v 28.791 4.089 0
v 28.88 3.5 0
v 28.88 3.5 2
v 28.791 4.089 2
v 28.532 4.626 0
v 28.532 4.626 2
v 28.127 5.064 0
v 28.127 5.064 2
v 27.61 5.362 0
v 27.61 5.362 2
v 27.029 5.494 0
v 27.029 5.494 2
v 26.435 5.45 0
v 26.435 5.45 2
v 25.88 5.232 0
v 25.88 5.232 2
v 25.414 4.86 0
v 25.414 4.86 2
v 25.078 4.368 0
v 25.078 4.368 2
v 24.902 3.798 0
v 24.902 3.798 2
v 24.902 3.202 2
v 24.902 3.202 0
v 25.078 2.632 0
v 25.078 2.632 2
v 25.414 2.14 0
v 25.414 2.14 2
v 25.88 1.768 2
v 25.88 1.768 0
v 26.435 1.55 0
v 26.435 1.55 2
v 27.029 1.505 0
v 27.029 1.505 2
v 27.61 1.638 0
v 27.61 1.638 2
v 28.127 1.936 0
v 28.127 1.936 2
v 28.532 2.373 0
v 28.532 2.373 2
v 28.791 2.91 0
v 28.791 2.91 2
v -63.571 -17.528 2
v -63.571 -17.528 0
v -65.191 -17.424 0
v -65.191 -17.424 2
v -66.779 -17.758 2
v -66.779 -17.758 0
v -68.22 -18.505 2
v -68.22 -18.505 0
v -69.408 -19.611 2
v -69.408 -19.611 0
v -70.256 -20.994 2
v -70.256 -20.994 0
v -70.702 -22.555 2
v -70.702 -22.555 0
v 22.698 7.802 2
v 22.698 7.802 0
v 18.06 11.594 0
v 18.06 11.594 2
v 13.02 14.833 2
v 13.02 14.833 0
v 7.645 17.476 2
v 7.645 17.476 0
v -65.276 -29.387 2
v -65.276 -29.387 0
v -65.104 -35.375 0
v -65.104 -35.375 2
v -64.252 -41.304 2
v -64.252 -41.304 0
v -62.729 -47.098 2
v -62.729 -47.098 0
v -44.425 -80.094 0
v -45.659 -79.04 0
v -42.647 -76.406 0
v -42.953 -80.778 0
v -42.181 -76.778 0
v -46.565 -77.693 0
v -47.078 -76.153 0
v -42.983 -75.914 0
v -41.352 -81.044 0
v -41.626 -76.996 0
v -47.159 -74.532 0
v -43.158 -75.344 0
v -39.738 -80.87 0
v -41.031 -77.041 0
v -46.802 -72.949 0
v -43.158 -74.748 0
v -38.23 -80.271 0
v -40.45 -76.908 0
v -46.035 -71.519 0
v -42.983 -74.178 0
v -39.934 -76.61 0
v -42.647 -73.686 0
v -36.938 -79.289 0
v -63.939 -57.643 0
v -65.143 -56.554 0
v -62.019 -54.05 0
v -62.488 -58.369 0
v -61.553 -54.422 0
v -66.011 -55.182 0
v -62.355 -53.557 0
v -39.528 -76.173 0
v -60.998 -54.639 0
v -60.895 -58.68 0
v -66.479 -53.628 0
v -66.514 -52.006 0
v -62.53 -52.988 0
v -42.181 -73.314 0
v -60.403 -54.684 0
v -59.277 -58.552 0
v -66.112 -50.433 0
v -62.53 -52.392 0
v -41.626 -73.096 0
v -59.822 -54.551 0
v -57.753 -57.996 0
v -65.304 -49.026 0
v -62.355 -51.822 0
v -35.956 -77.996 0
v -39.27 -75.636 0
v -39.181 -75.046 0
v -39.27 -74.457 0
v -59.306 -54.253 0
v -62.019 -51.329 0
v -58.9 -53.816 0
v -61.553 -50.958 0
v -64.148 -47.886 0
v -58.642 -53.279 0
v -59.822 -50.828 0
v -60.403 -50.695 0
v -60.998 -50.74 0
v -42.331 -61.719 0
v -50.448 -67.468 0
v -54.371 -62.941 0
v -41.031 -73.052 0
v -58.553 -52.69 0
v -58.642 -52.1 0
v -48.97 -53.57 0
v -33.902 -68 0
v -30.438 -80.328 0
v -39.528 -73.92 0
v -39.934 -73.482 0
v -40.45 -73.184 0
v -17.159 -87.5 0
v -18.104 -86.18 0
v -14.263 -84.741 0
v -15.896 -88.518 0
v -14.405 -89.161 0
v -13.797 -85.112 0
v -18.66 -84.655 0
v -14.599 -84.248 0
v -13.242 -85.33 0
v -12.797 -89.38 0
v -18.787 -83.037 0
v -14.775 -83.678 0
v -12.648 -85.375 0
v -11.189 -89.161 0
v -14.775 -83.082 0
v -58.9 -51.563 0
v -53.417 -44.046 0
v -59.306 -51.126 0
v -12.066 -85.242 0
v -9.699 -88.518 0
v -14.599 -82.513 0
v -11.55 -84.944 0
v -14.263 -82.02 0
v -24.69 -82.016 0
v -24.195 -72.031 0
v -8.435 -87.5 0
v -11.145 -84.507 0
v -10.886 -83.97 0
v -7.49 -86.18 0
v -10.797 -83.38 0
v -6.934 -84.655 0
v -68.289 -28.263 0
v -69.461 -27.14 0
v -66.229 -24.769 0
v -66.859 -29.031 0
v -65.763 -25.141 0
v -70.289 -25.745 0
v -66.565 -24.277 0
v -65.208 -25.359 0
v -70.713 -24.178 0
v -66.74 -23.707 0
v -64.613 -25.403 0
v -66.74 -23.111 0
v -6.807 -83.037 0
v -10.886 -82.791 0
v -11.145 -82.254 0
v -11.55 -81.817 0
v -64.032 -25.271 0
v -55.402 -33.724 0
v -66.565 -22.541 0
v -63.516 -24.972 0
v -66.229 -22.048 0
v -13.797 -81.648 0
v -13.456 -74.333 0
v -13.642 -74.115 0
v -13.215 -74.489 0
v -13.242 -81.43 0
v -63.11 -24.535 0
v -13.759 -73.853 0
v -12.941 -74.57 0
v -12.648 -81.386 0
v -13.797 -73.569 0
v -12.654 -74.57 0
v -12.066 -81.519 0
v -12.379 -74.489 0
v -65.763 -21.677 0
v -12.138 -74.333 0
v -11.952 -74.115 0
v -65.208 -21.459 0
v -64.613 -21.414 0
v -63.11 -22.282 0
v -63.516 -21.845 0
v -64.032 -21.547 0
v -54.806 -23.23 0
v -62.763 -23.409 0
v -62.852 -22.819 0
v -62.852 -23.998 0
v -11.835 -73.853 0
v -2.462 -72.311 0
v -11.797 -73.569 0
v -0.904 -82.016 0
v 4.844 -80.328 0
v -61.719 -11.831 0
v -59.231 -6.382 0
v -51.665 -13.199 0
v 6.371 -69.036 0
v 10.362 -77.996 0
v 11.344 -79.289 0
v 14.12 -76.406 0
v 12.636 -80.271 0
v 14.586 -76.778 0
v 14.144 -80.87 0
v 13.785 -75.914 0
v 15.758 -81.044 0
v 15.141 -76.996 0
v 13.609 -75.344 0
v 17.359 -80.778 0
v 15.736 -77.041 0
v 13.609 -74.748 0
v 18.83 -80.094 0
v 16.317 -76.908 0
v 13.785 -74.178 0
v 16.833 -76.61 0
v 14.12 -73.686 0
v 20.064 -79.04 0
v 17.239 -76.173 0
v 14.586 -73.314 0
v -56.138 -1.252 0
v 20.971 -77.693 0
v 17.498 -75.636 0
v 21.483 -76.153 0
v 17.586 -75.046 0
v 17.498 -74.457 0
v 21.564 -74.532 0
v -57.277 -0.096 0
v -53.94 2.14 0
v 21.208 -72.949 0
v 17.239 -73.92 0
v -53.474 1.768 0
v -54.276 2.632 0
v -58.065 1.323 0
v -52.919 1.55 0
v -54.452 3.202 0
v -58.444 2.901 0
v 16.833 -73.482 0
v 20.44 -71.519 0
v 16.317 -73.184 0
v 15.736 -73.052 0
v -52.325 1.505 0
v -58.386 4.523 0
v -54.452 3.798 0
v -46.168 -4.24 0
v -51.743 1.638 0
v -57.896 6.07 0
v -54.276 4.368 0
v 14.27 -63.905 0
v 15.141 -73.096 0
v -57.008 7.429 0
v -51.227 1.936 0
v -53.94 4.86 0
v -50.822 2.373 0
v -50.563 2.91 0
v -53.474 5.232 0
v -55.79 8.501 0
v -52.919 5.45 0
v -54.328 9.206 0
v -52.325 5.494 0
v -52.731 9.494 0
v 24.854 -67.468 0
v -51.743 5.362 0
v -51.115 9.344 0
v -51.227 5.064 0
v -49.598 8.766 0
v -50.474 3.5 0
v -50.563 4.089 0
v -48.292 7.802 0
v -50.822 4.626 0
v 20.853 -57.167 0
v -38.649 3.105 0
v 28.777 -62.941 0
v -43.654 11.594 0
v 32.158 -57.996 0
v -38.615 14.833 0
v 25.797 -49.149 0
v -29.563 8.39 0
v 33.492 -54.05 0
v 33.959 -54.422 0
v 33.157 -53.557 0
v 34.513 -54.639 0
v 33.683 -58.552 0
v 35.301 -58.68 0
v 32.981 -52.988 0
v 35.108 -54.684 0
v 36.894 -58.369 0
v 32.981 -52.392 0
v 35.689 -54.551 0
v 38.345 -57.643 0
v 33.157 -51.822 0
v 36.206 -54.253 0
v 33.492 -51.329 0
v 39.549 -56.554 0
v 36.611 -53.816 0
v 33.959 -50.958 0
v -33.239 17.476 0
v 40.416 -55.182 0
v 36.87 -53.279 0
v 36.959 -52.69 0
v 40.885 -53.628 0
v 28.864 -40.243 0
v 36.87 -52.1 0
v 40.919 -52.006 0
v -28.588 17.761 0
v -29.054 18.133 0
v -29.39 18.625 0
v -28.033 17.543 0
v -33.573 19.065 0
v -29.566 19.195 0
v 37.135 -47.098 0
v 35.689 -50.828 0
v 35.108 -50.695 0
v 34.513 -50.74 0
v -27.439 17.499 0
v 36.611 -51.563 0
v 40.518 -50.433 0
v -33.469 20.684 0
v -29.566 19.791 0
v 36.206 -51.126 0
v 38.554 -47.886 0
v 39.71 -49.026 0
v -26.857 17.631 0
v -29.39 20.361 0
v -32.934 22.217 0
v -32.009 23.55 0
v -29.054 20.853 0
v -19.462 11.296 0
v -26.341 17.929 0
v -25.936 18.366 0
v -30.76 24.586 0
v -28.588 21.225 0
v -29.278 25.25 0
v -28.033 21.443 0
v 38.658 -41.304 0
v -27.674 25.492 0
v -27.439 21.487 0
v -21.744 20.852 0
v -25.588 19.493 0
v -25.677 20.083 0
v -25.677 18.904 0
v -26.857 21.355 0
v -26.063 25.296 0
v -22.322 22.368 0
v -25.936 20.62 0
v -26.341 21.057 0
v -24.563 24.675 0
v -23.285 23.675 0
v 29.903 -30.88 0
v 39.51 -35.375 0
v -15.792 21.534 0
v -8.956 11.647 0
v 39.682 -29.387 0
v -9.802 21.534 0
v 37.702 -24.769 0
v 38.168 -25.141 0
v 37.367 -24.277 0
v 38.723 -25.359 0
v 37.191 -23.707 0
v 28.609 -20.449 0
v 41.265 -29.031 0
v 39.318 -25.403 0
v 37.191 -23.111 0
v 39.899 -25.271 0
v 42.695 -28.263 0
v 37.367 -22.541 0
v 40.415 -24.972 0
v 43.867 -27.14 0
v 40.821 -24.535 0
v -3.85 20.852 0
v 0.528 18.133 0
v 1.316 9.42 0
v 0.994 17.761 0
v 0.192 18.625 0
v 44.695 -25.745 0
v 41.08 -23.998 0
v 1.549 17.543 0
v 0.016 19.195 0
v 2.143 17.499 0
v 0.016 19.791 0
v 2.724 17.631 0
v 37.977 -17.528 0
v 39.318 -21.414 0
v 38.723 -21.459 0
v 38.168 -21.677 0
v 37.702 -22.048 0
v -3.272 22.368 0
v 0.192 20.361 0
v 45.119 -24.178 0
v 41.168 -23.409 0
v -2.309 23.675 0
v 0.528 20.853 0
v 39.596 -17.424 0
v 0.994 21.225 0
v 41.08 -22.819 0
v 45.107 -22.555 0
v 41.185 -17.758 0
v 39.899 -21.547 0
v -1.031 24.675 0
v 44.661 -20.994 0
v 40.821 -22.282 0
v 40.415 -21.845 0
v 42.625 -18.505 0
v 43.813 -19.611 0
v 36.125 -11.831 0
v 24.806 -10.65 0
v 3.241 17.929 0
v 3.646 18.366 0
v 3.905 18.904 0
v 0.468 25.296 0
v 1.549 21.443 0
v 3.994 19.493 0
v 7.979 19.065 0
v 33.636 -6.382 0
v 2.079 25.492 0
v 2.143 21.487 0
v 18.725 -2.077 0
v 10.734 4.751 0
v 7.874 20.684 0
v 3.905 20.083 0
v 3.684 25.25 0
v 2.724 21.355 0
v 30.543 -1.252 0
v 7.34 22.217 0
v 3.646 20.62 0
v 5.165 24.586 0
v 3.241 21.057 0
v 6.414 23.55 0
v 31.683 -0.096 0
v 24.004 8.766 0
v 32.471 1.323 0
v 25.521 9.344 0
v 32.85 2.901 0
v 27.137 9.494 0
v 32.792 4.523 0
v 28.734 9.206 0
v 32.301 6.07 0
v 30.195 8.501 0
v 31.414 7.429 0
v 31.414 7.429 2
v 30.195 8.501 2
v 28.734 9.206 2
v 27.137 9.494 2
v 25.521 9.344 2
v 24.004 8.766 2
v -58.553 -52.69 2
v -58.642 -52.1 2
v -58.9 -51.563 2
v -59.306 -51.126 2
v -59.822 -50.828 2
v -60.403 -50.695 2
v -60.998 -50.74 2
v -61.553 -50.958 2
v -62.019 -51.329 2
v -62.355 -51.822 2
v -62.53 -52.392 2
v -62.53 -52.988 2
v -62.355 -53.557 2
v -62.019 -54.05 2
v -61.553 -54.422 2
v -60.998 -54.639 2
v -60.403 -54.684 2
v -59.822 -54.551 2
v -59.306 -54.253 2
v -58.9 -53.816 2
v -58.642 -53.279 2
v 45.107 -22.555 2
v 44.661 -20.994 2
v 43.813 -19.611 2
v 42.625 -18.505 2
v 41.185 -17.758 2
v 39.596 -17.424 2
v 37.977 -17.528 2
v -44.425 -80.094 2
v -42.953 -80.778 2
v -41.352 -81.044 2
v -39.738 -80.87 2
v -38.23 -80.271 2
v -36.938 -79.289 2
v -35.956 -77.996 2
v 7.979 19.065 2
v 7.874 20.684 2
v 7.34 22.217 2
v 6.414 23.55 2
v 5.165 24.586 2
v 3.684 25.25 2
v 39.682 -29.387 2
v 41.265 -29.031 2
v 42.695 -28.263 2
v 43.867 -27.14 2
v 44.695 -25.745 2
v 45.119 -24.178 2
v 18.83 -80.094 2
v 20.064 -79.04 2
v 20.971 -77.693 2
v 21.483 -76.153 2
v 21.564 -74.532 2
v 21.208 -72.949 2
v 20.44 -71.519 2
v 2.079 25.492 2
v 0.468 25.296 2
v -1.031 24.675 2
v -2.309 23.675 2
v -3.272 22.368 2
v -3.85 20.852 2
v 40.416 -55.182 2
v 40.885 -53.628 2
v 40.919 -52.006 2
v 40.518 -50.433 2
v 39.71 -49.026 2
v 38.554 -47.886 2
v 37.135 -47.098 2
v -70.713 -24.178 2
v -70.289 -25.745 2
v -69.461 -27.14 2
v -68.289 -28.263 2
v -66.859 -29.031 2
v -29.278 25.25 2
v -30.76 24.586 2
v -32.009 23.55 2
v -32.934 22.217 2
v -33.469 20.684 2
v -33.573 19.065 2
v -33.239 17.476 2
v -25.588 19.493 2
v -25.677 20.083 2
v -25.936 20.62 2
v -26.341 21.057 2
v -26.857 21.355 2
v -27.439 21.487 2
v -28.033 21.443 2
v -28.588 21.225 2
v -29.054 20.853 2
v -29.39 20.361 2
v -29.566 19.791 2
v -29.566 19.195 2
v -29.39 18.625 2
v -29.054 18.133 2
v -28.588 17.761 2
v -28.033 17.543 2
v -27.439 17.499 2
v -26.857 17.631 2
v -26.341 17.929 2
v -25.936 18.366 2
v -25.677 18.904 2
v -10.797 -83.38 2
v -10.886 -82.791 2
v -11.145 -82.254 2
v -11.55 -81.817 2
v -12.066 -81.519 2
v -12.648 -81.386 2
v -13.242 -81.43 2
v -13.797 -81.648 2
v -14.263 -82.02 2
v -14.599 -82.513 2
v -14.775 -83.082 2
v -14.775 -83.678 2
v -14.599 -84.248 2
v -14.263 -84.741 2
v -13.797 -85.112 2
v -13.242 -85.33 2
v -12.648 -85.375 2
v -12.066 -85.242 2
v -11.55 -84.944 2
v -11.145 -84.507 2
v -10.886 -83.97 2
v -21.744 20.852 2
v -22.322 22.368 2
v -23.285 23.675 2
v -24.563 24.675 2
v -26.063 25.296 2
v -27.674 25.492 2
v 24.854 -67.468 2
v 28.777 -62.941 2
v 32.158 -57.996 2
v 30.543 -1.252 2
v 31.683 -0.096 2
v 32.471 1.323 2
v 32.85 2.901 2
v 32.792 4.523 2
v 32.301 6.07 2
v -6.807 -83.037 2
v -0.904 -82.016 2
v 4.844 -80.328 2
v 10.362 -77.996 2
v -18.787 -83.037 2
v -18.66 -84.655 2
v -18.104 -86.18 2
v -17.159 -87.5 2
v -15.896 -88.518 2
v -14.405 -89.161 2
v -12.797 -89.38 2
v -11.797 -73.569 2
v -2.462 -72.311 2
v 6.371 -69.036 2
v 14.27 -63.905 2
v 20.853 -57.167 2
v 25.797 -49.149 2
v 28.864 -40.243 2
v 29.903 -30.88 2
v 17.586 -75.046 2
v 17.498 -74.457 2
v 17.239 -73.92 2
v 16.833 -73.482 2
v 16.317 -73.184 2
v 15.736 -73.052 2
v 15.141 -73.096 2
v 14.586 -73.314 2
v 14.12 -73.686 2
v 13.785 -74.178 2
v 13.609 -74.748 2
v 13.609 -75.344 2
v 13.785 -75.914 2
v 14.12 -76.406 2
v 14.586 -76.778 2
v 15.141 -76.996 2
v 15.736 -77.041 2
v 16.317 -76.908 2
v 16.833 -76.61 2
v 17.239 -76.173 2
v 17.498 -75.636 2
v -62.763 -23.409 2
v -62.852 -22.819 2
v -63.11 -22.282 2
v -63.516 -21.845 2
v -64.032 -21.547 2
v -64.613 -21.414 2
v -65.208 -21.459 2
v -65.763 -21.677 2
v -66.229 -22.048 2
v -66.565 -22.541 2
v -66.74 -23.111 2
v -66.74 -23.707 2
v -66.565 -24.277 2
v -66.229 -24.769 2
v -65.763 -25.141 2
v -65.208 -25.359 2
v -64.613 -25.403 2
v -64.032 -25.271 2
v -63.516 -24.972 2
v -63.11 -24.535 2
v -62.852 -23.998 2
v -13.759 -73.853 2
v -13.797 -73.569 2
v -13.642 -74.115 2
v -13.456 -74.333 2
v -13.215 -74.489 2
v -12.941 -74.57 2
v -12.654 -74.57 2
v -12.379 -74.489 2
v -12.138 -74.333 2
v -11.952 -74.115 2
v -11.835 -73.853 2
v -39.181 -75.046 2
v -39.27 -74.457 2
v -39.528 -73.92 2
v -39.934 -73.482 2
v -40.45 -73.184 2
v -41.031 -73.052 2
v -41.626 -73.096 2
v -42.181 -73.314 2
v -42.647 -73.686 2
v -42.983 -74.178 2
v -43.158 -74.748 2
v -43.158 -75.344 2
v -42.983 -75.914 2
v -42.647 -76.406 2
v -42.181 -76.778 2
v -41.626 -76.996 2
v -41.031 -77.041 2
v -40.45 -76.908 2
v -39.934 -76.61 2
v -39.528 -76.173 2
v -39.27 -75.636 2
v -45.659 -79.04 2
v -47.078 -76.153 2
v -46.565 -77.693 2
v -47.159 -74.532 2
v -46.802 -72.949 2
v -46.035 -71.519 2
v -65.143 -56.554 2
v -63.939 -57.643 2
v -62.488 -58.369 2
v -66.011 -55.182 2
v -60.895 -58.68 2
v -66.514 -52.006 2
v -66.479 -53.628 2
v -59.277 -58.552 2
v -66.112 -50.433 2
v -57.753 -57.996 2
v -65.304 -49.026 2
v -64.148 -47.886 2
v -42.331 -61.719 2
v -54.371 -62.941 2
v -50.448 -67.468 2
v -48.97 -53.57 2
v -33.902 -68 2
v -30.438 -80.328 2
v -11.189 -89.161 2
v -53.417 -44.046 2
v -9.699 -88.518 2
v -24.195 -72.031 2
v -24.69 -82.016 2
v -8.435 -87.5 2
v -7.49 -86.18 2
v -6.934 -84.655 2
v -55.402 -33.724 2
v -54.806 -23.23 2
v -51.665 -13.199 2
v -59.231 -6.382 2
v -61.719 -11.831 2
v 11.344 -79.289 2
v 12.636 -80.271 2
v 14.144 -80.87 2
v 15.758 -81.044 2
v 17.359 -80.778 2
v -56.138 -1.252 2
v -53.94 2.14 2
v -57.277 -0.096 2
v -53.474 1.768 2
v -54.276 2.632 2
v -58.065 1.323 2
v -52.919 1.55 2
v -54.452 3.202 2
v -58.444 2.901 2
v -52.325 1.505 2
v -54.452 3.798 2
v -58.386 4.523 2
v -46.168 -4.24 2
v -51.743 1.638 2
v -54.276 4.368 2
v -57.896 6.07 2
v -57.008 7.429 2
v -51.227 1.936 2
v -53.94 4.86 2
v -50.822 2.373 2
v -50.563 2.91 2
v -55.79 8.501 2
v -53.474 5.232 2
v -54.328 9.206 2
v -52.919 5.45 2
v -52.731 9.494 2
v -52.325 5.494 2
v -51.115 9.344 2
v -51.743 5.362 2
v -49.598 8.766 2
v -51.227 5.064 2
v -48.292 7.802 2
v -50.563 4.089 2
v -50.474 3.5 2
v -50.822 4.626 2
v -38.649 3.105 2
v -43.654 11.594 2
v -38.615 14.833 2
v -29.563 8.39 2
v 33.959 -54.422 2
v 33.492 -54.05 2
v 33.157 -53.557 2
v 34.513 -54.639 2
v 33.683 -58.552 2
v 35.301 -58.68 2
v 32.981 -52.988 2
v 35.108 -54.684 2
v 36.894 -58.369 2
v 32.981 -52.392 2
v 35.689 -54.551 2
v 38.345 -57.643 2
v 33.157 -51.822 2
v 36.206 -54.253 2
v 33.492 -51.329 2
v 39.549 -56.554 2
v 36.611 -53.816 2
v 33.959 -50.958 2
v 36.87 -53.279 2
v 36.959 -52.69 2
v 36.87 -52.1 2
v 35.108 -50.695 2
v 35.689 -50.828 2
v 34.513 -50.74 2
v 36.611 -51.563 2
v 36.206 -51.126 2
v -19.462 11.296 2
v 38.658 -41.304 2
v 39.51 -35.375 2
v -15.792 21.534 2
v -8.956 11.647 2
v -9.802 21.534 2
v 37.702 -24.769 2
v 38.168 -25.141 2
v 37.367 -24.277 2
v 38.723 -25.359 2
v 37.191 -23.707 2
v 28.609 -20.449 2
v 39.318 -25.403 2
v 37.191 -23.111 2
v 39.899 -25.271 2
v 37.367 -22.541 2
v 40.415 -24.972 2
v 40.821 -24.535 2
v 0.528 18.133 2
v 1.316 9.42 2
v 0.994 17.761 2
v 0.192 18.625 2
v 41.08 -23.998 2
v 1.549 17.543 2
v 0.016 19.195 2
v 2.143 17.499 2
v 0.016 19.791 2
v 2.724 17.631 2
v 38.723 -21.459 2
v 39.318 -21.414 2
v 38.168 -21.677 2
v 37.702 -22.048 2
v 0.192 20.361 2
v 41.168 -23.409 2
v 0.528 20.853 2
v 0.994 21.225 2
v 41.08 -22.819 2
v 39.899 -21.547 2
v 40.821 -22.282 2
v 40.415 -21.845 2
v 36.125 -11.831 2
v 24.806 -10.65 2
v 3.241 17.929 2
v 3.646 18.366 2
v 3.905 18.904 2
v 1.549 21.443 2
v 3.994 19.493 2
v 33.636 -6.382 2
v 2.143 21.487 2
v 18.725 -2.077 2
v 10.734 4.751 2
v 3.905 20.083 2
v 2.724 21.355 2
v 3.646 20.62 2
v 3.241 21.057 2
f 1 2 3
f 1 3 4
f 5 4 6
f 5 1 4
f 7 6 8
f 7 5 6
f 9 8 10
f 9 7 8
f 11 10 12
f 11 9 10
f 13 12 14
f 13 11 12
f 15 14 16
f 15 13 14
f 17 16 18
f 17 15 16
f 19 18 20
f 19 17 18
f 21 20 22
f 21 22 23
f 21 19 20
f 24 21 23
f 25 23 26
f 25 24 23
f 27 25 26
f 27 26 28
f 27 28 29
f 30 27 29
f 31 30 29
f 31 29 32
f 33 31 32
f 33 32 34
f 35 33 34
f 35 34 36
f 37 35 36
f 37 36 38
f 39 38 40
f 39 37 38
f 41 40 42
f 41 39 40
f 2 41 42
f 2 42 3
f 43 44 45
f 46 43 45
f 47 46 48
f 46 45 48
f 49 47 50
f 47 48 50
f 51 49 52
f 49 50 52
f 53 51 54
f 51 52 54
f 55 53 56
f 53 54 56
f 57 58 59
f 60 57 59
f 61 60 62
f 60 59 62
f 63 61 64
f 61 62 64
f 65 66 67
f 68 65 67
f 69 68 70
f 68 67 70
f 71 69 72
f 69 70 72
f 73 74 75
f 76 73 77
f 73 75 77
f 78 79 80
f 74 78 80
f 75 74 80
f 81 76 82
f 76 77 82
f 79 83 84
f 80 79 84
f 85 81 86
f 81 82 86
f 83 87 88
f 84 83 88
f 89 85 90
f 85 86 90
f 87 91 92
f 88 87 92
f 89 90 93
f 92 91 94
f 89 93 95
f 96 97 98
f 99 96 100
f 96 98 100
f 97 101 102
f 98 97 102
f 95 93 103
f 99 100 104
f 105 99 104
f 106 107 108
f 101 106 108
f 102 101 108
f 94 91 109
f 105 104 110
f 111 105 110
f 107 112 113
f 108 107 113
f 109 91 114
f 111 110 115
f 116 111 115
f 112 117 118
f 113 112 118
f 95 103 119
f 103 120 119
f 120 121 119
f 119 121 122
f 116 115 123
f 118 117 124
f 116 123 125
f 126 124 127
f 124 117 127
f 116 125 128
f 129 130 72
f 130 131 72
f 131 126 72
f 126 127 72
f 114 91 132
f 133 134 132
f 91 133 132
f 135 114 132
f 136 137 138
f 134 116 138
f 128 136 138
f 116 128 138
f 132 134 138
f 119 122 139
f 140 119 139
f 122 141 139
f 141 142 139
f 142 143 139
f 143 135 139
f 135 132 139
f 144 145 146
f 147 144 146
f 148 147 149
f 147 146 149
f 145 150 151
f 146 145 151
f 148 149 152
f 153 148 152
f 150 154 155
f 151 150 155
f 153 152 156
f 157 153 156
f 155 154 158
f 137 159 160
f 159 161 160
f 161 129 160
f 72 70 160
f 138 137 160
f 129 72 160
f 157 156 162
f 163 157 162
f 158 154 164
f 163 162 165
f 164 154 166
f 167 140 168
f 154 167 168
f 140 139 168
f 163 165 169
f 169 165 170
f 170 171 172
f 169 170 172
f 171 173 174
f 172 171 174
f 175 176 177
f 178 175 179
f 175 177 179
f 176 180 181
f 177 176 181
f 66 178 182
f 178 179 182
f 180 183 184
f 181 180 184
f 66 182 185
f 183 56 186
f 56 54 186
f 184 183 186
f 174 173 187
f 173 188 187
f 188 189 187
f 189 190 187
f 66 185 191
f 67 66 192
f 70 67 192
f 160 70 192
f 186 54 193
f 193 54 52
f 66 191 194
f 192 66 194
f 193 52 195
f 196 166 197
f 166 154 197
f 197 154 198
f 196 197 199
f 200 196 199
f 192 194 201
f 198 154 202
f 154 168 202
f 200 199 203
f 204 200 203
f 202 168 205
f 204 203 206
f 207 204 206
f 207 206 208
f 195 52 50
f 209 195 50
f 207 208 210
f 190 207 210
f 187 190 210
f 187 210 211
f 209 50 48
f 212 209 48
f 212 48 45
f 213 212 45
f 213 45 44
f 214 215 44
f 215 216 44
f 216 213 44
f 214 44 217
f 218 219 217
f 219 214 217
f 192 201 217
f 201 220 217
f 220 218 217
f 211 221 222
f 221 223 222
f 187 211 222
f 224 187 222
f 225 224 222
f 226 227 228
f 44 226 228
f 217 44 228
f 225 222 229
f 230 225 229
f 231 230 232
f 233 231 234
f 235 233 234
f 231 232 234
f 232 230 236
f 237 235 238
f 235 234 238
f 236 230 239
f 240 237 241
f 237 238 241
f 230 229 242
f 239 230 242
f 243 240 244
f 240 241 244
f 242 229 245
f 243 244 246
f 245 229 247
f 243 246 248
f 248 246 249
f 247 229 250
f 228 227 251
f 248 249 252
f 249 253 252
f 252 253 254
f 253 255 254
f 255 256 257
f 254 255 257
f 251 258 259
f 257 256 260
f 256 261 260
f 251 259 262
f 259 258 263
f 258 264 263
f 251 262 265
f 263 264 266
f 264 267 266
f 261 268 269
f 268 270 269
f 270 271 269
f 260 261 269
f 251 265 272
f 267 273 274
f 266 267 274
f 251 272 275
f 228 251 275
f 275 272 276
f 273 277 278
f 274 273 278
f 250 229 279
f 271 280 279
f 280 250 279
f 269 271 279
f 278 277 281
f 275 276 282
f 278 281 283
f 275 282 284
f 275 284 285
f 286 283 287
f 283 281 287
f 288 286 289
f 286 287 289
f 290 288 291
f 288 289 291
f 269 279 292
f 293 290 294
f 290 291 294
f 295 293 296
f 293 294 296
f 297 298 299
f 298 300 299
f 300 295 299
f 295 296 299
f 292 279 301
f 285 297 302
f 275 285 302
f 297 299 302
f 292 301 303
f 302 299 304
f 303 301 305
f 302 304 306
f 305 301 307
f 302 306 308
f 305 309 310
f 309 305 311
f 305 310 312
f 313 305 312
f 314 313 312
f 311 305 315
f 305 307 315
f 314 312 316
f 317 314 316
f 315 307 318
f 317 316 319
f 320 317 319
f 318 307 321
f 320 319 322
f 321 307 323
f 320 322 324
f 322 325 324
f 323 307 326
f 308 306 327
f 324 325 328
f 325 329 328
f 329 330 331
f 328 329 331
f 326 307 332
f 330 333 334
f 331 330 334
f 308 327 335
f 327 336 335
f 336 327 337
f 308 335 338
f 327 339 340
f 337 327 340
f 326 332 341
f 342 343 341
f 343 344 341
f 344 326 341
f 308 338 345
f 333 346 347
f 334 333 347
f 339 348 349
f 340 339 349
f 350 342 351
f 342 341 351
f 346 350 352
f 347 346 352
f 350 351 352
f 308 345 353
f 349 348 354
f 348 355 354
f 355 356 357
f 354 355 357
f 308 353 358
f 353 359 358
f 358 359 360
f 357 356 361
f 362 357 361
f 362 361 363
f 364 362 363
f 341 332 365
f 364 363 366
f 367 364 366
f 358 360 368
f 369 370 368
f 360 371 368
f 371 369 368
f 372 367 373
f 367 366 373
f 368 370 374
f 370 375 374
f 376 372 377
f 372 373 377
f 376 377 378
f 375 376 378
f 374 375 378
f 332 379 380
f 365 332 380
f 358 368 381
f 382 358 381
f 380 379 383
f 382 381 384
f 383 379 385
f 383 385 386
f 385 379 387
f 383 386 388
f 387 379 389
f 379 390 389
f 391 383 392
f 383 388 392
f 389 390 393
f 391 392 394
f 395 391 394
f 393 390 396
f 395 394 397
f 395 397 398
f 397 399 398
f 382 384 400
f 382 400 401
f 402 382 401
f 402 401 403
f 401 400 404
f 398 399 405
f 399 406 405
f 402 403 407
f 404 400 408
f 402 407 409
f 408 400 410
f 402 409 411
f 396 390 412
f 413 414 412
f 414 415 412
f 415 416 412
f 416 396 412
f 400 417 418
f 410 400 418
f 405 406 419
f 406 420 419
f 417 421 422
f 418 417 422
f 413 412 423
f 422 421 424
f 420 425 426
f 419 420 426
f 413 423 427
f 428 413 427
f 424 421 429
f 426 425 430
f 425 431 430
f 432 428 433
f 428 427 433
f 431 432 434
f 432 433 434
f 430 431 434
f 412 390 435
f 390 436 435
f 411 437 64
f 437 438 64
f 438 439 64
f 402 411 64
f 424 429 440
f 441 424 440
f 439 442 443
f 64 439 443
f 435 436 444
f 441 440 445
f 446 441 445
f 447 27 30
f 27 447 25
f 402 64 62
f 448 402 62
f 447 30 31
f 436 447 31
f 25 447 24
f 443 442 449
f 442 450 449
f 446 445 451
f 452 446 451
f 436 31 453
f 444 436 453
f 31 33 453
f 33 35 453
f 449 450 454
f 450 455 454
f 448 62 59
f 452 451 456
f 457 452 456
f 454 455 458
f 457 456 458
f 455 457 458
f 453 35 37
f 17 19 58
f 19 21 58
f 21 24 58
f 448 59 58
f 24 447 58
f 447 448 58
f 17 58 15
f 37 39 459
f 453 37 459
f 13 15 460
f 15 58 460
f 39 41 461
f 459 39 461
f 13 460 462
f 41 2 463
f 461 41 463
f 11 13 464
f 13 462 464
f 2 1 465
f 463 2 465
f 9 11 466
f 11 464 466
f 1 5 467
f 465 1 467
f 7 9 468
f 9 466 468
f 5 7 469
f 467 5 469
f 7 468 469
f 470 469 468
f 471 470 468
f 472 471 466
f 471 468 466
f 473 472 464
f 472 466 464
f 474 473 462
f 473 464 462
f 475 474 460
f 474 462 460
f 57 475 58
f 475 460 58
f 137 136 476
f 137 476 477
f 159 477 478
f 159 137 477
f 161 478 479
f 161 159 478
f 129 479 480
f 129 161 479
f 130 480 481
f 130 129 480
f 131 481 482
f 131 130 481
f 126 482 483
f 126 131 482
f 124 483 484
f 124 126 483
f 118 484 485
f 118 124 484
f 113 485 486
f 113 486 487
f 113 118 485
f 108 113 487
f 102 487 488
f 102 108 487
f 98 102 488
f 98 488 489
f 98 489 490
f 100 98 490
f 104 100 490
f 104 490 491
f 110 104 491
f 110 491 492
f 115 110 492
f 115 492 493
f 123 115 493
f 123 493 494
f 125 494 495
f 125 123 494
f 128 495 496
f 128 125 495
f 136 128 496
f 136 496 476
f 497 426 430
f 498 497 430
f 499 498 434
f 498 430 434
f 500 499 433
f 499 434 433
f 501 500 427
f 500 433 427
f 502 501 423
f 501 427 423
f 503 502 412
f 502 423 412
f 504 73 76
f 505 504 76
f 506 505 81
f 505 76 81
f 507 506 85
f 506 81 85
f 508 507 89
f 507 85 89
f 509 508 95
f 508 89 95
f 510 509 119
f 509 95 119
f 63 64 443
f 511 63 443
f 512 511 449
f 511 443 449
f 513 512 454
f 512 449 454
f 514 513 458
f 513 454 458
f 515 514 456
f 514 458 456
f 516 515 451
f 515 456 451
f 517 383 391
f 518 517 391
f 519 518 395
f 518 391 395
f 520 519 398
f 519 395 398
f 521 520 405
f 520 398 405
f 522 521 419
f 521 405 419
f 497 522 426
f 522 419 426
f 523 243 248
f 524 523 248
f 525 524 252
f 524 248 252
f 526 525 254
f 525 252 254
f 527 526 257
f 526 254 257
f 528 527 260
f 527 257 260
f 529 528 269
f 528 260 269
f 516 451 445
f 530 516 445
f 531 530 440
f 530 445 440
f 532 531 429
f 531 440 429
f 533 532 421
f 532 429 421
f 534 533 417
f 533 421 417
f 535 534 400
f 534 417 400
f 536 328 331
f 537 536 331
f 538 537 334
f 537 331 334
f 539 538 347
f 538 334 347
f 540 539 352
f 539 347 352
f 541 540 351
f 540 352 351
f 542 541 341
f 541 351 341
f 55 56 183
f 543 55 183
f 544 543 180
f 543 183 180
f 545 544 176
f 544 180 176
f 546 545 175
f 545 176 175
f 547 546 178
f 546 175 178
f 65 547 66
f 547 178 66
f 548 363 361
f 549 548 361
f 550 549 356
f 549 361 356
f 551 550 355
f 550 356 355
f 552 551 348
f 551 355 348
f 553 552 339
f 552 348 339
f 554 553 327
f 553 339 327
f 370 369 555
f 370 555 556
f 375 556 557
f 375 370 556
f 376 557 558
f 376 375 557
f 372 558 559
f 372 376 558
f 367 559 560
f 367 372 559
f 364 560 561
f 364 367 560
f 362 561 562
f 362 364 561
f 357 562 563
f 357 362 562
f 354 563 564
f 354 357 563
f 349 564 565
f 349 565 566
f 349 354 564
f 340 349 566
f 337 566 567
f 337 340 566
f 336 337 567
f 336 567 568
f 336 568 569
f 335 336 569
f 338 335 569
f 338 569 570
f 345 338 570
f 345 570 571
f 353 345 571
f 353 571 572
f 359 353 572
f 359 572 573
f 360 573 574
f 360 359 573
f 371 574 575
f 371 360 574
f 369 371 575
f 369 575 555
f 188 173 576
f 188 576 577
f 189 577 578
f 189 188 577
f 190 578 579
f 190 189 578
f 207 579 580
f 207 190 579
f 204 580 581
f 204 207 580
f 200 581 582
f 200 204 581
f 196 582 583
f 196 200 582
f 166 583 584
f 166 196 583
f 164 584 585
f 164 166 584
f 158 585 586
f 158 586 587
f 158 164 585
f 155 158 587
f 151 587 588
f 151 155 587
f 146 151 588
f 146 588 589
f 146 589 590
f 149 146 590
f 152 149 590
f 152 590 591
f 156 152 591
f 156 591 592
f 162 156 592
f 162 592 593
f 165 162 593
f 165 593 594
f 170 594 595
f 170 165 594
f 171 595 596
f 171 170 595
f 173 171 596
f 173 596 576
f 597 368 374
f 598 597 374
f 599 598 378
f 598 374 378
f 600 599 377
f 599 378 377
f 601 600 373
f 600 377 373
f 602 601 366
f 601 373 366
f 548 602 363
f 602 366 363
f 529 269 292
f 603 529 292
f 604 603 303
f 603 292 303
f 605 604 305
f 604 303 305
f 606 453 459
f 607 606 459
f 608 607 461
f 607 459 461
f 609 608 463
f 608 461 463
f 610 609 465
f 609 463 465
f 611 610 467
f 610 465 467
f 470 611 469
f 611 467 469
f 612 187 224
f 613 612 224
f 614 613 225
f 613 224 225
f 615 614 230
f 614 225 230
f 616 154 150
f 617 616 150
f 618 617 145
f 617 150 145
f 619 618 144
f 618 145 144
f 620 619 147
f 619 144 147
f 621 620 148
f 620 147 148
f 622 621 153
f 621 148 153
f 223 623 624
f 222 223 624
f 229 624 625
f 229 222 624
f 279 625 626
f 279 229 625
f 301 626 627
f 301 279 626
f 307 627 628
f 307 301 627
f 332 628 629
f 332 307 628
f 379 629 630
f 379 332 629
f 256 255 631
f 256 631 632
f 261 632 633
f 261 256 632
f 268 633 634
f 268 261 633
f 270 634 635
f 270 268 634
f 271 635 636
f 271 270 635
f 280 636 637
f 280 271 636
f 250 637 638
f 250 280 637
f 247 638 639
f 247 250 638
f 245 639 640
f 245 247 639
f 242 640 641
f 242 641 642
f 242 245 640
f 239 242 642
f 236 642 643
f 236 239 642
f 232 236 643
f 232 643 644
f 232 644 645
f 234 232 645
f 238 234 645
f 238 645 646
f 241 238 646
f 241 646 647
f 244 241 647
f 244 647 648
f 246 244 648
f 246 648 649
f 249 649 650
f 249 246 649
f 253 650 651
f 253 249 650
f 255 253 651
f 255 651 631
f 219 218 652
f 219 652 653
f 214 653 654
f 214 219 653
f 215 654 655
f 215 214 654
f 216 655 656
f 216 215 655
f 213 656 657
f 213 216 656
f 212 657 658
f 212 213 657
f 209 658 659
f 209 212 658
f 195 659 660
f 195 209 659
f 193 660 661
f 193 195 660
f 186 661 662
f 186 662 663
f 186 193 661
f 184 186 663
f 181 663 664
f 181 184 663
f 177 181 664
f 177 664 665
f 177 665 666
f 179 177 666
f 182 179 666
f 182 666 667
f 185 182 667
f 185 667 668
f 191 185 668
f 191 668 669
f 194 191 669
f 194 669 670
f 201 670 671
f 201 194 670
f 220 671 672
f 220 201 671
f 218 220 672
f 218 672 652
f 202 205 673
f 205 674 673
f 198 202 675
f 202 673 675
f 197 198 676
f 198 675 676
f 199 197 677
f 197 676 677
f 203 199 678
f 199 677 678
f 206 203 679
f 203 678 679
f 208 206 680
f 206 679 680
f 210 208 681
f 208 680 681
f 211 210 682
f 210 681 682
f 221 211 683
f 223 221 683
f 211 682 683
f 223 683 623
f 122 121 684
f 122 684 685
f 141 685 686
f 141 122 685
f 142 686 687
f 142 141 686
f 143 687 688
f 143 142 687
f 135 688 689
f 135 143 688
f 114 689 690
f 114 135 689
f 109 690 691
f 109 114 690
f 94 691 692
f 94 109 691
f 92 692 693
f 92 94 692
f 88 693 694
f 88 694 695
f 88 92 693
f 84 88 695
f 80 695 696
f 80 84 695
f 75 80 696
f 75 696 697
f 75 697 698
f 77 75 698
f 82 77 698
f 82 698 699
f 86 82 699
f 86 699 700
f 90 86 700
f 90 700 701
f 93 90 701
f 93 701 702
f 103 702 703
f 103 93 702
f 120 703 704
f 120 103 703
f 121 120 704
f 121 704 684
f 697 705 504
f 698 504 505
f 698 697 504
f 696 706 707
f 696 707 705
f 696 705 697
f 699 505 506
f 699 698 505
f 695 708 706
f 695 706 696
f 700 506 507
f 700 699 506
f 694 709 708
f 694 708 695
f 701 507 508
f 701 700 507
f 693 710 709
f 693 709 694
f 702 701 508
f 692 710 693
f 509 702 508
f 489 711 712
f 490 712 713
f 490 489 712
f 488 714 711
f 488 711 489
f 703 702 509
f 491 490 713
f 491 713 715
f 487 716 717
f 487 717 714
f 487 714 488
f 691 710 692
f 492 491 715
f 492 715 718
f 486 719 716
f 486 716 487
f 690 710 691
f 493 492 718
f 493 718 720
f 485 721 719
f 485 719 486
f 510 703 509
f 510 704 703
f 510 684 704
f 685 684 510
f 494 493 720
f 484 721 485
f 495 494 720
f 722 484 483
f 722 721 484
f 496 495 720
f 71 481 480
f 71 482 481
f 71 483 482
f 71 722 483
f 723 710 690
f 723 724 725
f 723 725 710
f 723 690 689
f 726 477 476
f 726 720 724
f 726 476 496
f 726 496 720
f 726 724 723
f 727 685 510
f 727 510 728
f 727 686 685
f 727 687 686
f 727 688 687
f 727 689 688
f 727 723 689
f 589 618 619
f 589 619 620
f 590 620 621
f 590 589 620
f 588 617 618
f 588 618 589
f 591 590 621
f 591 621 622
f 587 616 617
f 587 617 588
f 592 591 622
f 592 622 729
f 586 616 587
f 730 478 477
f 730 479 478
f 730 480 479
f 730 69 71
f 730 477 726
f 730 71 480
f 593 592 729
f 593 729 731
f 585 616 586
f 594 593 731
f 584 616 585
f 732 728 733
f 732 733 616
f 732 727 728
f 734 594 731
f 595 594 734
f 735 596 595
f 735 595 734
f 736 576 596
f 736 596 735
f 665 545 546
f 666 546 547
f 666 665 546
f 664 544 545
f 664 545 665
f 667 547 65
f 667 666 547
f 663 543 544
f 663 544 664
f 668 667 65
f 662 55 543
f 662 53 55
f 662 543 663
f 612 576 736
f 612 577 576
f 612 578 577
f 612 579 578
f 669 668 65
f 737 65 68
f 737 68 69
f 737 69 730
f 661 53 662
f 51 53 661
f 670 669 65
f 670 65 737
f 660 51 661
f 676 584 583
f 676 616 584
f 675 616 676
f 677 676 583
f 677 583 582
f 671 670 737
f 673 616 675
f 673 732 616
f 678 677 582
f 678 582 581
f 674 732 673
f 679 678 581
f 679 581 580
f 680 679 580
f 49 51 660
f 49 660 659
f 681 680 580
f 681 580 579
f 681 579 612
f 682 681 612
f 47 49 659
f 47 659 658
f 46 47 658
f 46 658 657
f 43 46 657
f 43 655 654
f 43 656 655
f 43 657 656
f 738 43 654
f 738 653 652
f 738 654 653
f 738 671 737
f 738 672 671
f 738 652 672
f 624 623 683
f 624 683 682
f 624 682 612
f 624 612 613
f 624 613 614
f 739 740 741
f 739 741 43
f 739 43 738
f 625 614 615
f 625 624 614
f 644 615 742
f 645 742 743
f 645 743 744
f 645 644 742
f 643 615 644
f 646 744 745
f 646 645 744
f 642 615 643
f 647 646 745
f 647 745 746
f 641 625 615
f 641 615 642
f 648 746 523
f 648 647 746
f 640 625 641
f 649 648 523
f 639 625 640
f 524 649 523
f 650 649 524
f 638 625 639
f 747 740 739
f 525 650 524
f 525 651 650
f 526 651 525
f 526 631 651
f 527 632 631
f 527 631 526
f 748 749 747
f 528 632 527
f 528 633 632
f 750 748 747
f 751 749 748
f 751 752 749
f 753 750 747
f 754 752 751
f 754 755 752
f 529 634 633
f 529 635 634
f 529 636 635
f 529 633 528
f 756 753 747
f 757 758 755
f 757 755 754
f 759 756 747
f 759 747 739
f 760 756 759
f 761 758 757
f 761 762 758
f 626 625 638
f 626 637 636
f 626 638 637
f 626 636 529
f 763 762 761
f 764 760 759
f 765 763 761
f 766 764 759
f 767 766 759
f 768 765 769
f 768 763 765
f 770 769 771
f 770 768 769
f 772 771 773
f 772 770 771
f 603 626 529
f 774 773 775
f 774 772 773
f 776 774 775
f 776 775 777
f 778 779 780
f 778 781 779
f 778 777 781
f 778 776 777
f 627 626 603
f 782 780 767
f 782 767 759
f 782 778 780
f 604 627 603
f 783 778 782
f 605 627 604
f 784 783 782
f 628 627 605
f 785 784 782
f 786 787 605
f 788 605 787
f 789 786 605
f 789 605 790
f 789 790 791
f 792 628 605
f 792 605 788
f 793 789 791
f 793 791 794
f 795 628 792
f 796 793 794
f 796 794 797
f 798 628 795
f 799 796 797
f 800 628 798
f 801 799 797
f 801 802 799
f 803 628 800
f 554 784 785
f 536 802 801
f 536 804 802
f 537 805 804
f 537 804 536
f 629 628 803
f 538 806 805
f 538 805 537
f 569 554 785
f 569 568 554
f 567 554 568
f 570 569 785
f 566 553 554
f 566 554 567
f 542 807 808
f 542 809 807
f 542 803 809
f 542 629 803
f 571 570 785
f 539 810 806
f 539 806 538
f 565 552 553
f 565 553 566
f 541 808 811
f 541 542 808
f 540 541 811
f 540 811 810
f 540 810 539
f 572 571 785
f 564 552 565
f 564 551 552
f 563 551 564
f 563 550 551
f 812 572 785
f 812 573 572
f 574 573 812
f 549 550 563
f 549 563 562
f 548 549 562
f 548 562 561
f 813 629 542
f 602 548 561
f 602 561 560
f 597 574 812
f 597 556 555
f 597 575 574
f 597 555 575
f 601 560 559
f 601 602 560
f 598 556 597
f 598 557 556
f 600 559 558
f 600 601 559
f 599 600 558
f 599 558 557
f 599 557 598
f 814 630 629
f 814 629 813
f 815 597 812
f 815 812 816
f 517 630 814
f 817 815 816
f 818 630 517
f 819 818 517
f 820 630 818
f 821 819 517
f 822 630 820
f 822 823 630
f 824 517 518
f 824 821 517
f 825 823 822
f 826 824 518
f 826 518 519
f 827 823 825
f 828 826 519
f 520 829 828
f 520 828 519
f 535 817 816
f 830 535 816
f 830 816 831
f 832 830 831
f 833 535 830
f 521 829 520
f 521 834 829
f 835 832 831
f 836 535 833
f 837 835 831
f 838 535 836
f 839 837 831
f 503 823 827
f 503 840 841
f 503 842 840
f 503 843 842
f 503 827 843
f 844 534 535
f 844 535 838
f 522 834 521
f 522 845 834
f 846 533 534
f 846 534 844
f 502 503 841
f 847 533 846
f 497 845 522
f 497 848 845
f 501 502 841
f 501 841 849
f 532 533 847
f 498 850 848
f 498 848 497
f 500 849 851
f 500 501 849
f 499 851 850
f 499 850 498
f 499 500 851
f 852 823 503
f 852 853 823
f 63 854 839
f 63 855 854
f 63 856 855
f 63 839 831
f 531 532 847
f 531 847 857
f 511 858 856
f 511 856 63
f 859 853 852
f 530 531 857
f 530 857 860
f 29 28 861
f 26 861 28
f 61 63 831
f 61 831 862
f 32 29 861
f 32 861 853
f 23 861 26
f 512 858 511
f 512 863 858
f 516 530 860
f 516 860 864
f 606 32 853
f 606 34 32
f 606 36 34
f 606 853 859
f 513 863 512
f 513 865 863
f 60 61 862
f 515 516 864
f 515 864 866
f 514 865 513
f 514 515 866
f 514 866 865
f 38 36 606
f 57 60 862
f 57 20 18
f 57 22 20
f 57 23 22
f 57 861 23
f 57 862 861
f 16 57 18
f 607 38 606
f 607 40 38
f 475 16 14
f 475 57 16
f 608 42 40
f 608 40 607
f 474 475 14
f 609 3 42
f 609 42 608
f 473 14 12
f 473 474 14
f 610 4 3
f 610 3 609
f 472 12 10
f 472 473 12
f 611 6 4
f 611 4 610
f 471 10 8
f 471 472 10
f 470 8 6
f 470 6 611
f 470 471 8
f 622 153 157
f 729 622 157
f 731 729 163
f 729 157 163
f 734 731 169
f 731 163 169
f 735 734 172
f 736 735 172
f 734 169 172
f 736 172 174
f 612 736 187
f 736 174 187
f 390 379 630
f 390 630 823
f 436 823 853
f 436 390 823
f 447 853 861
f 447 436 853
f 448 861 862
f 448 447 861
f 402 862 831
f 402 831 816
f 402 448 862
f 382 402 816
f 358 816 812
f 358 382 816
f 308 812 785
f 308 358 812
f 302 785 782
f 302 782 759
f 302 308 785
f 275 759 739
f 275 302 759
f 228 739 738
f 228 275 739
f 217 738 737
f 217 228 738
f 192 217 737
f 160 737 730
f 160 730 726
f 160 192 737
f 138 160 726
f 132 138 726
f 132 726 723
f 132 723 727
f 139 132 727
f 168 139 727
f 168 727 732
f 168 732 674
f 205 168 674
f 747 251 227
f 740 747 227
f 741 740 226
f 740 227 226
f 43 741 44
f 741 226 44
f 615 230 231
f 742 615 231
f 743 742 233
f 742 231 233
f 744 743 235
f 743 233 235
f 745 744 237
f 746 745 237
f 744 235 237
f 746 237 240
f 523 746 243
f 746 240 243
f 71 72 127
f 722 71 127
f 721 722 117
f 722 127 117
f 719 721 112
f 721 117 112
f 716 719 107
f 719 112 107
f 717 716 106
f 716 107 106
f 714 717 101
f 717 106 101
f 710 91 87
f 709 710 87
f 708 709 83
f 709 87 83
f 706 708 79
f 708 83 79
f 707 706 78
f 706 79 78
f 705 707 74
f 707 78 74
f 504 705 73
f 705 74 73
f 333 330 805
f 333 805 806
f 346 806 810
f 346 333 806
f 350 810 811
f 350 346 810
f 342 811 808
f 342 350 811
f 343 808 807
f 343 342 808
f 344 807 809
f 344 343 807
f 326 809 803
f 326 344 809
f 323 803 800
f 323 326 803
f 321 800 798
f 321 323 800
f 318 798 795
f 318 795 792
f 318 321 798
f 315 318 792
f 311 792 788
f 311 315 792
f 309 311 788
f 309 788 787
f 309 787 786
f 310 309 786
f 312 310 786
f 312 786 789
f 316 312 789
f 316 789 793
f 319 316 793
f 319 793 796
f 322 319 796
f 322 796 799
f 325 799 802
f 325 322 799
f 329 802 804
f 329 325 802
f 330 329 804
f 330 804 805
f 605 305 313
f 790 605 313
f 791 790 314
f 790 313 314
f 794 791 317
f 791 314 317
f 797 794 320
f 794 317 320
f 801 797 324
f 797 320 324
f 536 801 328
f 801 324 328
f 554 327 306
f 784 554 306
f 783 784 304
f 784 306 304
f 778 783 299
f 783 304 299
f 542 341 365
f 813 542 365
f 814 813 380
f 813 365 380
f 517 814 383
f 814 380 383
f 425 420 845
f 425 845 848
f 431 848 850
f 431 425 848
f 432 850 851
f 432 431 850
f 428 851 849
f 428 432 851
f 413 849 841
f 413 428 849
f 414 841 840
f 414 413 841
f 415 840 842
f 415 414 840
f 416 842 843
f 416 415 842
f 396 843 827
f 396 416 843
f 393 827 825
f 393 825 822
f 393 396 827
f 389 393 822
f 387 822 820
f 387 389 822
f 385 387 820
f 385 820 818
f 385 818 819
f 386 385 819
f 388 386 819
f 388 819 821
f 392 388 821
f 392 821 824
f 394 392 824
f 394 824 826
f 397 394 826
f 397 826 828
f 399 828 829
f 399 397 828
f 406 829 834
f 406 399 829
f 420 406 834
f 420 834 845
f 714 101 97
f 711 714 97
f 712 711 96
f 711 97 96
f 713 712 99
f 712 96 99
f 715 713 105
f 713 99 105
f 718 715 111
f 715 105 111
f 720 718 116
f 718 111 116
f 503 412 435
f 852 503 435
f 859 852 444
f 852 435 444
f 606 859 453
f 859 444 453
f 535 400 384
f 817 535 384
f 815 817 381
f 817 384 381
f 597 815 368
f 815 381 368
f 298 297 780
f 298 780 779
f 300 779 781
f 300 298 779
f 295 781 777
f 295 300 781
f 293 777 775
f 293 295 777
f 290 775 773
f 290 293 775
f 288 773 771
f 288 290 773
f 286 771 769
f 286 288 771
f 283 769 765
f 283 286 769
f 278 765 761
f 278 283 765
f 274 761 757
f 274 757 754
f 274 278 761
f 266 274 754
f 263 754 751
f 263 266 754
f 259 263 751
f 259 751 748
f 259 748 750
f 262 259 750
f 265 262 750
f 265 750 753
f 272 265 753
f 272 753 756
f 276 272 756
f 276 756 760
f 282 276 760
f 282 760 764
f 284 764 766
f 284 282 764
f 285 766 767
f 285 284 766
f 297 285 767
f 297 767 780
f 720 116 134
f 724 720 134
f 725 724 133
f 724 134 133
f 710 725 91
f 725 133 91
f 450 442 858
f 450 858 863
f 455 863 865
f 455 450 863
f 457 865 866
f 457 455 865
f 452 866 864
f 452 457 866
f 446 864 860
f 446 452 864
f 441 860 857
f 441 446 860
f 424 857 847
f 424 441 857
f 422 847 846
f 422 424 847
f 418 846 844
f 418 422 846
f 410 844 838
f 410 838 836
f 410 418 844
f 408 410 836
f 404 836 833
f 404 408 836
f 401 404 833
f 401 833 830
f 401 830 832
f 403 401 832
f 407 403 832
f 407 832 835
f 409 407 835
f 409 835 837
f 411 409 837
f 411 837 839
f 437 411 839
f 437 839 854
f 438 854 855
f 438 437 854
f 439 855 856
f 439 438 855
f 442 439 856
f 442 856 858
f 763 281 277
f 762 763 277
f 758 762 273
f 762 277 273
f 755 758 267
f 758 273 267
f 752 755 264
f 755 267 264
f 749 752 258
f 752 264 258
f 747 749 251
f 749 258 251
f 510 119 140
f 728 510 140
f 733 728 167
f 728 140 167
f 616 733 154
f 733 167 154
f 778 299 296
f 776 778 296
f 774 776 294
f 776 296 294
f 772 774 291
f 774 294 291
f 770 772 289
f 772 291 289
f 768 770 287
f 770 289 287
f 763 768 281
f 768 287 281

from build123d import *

# Parameters (mm, degrees)
SKETCH_1_R          = 42.7
SKETCH_1_R_2        = 2
EXTRUDE_1_DEPTH     = 2
SKETCH_2_R          = 1
CUT_EXTRUDE_1_DEPTH = 2


with BuildPart() as part:
    # 草图1 → 凸台-拉伸1 (new body)
    with BuildSketch(Plane.XY):
        with BuildLine():
            ThreePointArc((-70.701698086, -22.554916187), (-69.461279061, -27.140293833), (-65.275895868, -29.386823389))
            ThreePointArc((-65.275895868, -29.386823389), (-64.762769434, -38.351863236), (-62.729367044, -47.098320399))
            ThreePointArc((-62.729367044, -47.098320399), (-66.112292293, -50.433008431), (-66.010615464, -55.182112487))
            ThreePointArc((-66.010615464, -55.182112487), (-62.488066258, -58.368956475), (-57.752532286, -57.99606841))
            ThreePointArc((-57.752532286, -57.99606841), (-52.473996389, -65.260522759), (-46.034697694, -71.519170416))
            ThreePointArc((-46.034697694, -71.519170416), (-47.077727048, -76.153435976), (-44.424631557, -80.093665897))
            ThreePointArc((-44.424631557, -80.093665897), (-39.738336654, -80.870175779), (-35.956150478, -77.996259418))
            ThreePointArc((-35.956150478, -77.996259418), (-27.58810297, -81.253715341), (-18.787339807, -83.037477084))
            ThreePointArc((-18.787339807, -83.037477084), (-17.159318816, -87.4999736), (-12.797143736, -89.380334226))
            ThreePointArc((-12.797143736, -89.380334226), (-8.434968656, -87.4999736), (-6.806947664, -83.037477084))
            ThreePointArc((-6.806947664, -83.037477084), (1.993815499, -81.253715341), (10.361863007, -77.996259418))
            ThreePointArc((10.361863007, -77.996259418), (14.144049183, -80.870175779), (18.830344086, -80.093665897))
            ThreePointArc((18.830344086, -80.093665897), (21.483439576, -76.153435976), (20.440410223, -71.519170416))
            ThreePointArc((20.440410223, -71.519170416), (26.879708918, -65.260522759), (32.158244814, -57.99606841))
            ThreePointArc((32.158244814, -57.99606841), (36.893778787, -58.368956475), (40.416327993, -55.182112487))
            ThreePointArc((40.416327993, -55.182112487), (40.518004822, -50.433008431), (37.135079573, -47.098320399))
            ThreePointArc((37.135079573, -47.098320399), (39.168481963, -38.351863236), (39.681608397, -29.386823389))
            ThreePointArc((39.681608397, -29.386823389), (43.866991589, -27.140293833), (45.107410614, -22.554916187))
            ThreePointArc((45.107410614, -22.554916187), (42.625387107, -18.504744978), (37.976620826, -17.528374363))
            ThreePointArc((37.976620826, -17.528374363), (34.958536021, -9.071046044), (30.543338974, -1.251757506))
            ThreePointArc((30.543338974, -1.251757506), (32.849741796, 2.90093241), (31.414206364, 7.429018709))
            ThreePointArc((31.414206364, 7.429018709), (27.136507447, 9.49435633), (22.697850582, 7.802418757))
            ThreePointArc((22.697850582, 7.802418757), (15.586499181, 13.285476247), (7.644772521, 17.476444614))
            ThreePointArc((7.644772521, 17.476444614), (7.339928372, 22.216845183), (3.68421084, 25.25000473))
            ThreePointArc((3.68421084, 25.25000473), (-1.031024306, 24.67477866), (-3.850329562, 20.851711124))
            ThreePointArc((-3.850329562, 20.851711124), (-12.797143736, 21.619665774), (-21.743957909, 20.851711124))
            ThreePointArc((-21.743957909, 20.851711124), (-24.563263165, 24.67477866), (-29.278498311, 25.25000473))
            ThreePointArc((-29.278498311, 25.25000473), (-32.934215843, 22.216845183), (-33.239059992, 17.476444613))
            ThreePointArc((-33.239059992, 17.476444613), (-41.180786652, 13.285476247), (-48.292138053, 7.802418757))
            ThreePointArc((-48.292138053, 7.802418757), (-52.730794918, 9.49435633), (-57.008493835, 7.429018709))
            ThreePointArc((-57.008493835, 7.429018709), (-58.444029267, 2.90093241), (-56.137626446, -1.251757506))
            ThreePointArc((-56.137626446, -1.251757506), (-60.552823492, -9.071046044), (-63.570908298, -17.528374363))
            ThreePointArc((-63.570908298, -17.528374363), (-68.219674578, -18.504744978), (-70.701698086, -22.554916187))
        make_face()
        with Locations((-12.797143736, -30.880334226)):
            Circle(SKETCH_1_R, mode=Mode.SUBTRACT)
        with Locations((-64.762769434, -23.408805217)):
            Circle(SKETCH_1_R_2, mode=Mode.SUBTRACT)
        with Locations((-52.473996389, 3.499854306)):
            Circle(SKETCH_1_R_2, mode=Mode.SUBTRACT)
        with Locations((-27.58810297, 19.493046888)):
            Circle(SKETCH_1_R_2, mode=Mode.SUBTRACT)
        with Locations((1.993815499, 19.493046888)):
            Circle(SKETCH_1_R_2, mode=Mode.SUBTRACT)
        with Locations((26.879708918, 3.499854306)):
            Circle(SKETCH_1_R_2, mode=Mode.SUBTRACT)
        with Locations((39.168481963, -23.408805217)):
            Circle(SKETCH_1_R_2, mode=Mode.SUBTRACT)
        with Locations((34.958536021, -52.689622409)):
            Circle(SKETCH_1_R_2, mode=Mode.SUBTRACT)
        with Locations((15.586499181, -75.0461447)):
            Circle(SKETCH_1_R_2, mode=Mode.SUBTRACT)
        with Locations((-12.797143736, -83.380334226)):
            Circle(SKETCH_1_R_2, mode=Mode.SUBTRACT)
        with Locations((-41.180786652, -75.0461447)):
            Circle(SKETCH_1_R_2, mode=Mode.SUBTRACT)
        with Locations((-60.552823492, -52.689622409)):
            Circle(SKETCH_1_R_2, mode=Mode.SUBTRACT)
    extrude(amount=EXTRUDE_1_DEPTH)

    # 草图2 → 切除-拉伸1 (cut)
    with BuildSketch(Plane.XY.offset(2)):
        with Locations((-12.797143736, -73.580334226)):
            Circle(SKETCH_2_R)
    extrude(amount=-CUT_EXTRUDE_1_DEPTH, mode=Mode.SUBTRACT)


solid = part.part
